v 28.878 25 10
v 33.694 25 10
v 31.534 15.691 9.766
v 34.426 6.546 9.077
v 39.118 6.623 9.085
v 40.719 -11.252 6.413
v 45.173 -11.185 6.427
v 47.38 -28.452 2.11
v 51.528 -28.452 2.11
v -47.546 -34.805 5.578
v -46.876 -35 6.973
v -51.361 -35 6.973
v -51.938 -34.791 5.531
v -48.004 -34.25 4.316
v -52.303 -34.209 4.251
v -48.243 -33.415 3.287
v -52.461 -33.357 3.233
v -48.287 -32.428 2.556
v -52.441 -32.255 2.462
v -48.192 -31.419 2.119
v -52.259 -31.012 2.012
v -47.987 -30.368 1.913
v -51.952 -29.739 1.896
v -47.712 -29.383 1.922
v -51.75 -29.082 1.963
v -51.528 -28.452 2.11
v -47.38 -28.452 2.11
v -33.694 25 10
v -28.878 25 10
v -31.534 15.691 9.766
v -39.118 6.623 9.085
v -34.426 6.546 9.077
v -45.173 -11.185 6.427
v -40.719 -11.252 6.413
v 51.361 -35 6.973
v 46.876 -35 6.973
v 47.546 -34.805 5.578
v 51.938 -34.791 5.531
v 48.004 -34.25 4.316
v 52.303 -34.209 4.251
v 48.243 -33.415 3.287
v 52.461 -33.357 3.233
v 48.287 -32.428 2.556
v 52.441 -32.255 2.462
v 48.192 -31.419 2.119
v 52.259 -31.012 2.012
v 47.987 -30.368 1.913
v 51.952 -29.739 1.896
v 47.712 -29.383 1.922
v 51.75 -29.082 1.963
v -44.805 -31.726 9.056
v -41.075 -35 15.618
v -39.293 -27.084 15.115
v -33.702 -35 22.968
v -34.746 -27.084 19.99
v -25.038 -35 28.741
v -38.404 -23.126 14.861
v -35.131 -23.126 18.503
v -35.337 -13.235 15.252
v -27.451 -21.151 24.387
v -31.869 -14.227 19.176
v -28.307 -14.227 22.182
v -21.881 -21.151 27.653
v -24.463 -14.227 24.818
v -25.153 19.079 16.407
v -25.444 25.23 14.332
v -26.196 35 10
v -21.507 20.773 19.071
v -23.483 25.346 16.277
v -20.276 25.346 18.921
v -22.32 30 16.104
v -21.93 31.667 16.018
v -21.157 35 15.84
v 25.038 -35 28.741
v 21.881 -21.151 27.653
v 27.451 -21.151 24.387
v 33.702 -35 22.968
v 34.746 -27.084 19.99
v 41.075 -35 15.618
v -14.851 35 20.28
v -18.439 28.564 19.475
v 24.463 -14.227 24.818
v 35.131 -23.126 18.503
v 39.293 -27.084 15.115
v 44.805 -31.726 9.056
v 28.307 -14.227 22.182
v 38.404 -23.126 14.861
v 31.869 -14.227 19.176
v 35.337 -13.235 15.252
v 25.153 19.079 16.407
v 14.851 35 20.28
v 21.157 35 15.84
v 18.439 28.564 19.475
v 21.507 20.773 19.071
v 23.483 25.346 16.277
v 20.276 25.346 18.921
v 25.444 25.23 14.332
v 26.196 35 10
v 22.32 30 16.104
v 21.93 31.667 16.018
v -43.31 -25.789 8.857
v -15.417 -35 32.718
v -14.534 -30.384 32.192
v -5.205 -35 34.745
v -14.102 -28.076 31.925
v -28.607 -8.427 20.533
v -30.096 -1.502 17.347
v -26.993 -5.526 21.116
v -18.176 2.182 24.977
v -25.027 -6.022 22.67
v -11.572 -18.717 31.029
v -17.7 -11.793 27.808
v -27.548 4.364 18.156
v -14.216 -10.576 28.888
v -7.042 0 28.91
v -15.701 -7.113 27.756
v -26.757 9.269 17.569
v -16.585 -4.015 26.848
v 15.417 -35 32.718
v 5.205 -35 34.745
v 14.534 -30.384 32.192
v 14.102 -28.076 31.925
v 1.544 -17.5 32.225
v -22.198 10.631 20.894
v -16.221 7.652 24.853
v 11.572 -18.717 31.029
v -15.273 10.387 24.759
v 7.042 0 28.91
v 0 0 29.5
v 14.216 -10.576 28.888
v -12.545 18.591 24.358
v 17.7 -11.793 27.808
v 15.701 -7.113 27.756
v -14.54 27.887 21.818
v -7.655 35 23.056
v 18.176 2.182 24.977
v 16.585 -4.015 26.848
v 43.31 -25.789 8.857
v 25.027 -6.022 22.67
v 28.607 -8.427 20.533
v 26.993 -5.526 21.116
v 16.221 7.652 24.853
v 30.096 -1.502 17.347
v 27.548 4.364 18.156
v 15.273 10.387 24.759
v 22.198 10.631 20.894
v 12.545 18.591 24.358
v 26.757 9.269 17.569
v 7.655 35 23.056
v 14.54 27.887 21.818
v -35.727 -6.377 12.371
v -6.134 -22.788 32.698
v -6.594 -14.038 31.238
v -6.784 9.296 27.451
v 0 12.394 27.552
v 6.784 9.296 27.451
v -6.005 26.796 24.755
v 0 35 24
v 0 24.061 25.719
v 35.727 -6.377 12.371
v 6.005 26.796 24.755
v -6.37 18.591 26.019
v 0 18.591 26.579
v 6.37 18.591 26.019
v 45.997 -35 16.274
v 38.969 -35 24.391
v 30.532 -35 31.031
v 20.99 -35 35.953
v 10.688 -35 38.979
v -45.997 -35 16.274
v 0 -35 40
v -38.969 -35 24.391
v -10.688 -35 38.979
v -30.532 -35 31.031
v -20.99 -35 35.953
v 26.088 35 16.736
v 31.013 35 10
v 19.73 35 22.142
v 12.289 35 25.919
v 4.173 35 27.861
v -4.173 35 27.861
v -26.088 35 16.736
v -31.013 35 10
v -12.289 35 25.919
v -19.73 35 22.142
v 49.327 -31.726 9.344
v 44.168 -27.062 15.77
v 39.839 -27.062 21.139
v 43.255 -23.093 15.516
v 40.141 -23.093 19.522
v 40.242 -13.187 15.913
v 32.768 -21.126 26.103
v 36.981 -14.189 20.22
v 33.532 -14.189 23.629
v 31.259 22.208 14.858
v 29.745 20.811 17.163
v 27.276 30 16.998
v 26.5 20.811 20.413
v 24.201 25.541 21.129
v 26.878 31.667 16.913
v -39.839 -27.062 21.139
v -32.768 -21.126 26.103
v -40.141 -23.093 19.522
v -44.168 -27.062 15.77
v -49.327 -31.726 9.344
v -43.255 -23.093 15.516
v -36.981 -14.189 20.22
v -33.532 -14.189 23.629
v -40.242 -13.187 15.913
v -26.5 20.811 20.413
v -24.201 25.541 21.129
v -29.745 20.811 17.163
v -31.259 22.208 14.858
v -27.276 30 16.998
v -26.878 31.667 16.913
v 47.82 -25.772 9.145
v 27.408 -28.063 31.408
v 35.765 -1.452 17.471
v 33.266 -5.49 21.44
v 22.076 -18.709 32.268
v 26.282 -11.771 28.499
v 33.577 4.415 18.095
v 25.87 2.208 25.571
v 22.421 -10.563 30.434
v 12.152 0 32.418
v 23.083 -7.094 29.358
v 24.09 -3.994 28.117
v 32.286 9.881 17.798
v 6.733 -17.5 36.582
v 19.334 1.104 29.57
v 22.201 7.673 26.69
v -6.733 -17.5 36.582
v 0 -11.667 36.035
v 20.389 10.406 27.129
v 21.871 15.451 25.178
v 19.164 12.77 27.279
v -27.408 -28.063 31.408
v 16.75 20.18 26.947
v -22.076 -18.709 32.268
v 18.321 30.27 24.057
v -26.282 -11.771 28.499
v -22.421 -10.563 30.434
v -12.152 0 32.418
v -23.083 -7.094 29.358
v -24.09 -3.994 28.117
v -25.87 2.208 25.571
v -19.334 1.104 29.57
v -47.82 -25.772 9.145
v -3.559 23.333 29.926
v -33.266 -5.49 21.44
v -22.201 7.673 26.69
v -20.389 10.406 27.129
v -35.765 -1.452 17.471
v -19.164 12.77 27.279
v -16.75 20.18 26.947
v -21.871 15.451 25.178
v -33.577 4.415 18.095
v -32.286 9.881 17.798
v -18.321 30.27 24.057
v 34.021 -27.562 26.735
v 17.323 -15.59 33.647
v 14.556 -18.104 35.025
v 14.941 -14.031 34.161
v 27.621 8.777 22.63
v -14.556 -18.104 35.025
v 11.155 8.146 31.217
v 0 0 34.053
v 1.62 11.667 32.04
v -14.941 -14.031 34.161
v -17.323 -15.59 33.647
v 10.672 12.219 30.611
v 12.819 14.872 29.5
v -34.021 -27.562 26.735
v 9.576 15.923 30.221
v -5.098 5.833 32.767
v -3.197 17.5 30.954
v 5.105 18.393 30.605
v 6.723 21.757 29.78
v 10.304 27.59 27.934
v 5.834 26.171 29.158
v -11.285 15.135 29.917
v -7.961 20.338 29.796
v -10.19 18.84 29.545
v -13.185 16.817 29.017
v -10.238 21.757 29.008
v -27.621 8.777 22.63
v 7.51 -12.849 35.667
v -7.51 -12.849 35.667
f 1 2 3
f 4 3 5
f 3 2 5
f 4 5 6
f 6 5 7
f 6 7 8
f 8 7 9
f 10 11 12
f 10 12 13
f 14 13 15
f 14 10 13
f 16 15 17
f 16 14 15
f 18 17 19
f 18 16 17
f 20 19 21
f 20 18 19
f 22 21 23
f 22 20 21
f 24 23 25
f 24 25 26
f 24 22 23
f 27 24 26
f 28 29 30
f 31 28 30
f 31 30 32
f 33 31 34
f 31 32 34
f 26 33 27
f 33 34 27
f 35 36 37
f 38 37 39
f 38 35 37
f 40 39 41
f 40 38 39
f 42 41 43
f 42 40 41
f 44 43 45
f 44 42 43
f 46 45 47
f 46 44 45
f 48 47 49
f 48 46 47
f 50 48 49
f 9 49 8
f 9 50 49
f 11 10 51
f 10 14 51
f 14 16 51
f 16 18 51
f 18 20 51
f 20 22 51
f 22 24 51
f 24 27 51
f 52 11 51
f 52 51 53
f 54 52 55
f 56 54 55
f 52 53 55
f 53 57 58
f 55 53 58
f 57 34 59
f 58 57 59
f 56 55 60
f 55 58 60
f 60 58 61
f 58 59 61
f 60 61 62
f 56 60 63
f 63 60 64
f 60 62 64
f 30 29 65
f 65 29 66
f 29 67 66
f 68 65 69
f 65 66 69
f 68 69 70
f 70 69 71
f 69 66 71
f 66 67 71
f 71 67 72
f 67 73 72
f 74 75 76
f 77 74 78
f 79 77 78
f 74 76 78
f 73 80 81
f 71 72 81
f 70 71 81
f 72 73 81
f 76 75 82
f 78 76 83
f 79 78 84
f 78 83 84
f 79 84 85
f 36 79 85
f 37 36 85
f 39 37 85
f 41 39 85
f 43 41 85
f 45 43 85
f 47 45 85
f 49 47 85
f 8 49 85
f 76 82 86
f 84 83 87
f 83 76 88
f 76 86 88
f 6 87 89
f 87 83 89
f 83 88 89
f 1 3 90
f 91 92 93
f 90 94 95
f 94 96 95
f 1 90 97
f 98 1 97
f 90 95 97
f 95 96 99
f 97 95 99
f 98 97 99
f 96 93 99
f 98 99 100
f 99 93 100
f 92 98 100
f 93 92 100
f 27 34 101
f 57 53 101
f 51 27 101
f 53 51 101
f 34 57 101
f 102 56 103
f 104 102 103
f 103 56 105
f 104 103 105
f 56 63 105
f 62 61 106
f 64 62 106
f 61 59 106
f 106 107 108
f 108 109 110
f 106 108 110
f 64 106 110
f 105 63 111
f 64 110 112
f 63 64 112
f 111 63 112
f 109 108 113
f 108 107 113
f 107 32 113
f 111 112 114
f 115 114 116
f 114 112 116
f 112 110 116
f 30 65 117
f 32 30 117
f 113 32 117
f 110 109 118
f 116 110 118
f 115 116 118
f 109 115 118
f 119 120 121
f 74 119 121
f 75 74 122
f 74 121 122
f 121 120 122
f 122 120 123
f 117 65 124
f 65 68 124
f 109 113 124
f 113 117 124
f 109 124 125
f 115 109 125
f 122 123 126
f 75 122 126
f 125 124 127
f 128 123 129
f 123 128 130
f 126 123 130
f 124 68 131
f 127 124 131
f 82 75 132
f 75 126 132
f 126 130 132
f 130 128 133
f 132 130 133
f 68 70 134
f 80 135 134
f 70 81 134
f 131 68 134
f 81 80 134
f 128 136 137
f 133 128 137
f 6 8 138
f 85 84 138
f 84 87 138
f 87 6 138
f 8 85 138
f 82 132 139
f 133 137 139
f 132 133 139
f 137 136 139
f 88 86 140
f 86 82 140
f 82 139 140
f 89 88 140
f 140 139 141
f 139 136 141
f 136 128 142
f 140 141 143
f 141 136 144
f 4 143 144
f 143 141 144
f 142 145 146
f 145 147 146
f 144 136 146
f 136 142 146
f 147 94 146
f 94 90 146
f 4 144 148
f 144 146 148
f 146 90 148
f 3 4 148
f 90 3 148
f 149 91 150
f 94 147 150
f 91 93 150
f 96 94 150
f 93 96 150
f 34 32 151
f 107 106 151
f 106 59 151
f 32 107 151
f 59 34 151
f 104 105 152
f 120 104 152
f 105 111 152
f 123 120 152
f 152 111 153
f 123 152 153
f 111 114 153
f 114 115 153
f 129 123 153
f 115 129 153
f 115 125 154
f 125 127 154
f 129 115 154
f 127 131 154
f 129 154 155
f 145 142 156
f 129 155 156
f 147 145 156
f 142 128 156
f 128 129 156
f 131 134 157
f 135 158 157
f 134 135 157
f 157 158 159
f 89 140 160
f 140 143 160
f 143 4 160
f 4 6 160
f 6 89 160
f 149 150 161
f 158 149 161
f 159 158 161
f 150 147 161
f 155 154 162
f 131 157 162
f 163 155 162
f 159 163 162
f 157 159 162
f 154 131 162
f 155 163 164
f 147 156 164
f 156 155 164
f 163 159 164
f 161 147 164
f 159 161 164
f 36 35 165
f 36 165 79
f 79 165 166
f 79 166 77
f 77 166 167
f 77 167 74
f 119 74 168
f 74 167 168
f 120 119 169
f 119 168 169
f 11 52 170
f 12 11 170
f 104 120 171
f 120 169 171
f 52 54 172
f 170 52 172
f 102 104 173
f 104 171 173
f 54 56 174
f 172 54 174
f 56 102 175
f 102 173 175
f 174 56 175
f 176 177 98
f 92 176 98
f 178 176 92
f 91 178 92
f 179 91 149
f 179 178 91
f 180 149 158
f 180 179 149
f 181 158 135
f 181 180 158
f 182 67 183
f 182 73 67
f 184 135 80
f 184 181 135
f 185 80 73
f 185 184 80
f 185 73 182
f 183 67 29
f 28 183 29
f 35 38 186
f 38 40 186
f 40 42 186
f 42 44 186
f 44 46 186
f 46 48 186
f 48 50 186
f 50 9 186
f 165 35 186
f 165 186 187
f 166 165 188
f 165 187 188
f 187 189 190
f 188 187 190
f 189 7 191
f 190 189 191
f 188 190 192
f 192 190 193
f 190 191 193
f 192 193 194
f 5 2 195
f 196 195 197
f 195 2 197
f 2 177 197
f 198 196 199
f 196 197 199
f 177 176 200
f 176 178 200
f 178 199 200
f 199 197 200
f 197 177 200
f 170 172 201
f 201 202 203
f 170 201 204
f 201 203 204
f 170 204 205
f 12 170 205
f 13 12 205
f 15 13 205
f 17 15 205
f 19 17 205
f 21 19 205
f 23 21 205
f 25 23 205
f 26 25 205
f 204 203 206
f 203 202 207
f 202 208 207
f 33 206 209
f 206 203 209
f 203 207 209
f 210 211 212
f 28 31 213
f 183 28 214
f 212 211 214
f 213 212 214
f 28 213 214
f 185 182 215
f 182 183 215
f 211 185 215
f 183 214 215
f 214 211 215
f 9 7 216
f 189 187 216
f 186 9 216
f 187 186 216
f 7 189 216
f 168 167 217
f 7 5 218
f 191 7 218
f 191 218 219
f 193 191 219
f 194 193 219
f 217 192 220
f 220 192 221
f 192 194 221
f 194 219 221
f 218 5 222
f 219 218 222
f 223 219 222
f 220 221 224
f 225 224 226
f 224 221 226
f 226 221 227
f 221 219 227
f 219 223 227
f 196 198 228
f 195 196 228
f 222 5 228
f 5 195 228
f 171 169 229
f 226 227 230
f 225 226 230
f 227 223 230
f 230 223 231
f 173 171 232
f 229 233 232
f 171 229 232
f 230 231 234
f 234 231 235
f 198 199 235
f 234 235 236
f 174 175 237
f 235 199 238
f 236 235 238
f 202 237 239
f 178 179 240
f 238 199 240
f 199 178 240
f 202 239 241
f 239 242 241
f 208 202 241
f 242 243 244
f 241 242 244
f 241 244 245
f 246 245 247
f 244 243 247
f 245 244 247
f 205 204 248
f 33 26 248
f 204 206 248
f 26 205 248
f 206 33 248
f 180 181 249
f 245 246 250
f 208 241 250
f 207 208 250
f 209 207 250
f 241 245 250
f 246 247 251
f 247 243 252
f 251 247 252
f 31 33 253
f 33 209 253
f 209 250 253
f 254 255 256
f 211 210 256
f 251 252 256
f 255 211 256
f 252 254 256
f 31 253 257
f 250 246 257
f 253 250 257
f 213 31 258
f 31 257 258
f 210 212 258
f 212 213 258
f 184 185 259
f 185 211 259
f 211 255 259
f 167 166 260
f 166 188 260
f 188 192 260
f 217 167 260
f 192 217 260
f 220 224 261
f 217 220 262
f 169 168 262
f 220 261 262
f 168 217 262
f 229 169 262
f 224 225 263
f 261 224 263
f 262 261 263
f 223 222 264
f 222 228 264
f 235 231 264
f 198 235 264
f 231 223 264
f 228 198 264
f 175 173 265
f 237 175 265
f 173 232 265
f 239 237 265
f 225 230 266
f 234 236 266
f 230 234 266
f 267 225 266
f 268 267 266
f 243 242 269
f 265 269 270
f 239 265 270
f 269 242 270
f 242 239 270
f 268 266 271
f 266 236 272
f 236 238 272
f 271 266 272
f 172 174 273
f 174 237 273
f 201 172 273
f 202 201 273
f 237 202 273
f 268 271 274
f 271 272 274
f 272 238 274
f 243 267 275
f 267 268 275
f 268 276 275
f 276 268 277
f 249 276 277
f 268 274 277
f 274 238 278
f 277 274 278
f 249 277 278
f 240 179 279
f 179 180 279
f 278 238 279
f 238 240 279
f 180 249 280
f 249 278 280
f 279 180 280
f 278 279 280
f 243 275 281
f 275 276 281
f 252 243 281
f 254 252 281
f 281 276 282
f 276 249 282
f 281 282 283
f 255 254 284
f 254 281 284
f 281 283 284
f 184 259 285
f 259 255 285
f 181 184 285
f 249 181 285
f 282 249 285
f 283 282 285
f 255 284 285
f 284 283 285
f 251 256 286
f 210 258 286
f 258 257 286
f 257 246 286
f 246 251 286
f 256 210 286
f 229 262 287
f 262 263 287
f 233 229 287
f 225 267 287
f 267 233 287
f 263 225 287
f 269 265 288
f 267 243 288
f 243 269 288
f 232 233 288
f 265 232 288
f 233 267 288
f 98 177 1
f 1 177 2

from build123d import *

# Parameters (mm, degrees)
F6_DEPTH = 60
F7_R     = 5.08


with BuildPart() as f4:
    # F1 (on offset) → F4 section 0
    with BuildSketch(Plane.XZ.offset(35)):
        with BuildLine():
            Line((-54, 0), (-50, 0))
            ThreePointArc((-50, 0), (0, 35), (50, 0))
            Line((50, 0), (54, 0))
            ThreePointArc((54, 0), (0, 40), (-54, 0))
        make_face()
    # F3 (on offset) → F4 section 1
    with BuildSketch(Plane.XZ.offset(-35)):
        with BuildLine():
            ThreePointArc((-30.6, 0), (0, 24), (30.6, 0))
            Line((30.6, 0), (34.8134934902, 0))
            ThreePointArc((34.8134934902, 0), (0, 28.1062878531), (-34.8134934902, 0))
            Line((-34.8134934902, 0), (-30.6, 0))
        make_face()
    loft()

    # F5 (on Right) → F6 (cut, symmetric)
    with BuildSketch(Plane.YZ):
        with BuildLine():
            Line((-35, 0), (35, 0))
            Line((35, 0), (35, 10))
            Line((35, 10), (25, 10))
            ThreePointArc((25, 10), (-5.4138126515, 7.4828759089), (-35, 0))
        make_face()
    extrude(amount=F6_DEPTH, both=True, mode=Mode.SUBTRACT)

    # F7
    f7_edges = [f4.edges().sort_by_distance(p)[0] for p in [
        (52, -35, 0),
        (-52, -35, 0),
    ]]
    fillet(f7_edges, radius=F7_R)


solid = f4.part
